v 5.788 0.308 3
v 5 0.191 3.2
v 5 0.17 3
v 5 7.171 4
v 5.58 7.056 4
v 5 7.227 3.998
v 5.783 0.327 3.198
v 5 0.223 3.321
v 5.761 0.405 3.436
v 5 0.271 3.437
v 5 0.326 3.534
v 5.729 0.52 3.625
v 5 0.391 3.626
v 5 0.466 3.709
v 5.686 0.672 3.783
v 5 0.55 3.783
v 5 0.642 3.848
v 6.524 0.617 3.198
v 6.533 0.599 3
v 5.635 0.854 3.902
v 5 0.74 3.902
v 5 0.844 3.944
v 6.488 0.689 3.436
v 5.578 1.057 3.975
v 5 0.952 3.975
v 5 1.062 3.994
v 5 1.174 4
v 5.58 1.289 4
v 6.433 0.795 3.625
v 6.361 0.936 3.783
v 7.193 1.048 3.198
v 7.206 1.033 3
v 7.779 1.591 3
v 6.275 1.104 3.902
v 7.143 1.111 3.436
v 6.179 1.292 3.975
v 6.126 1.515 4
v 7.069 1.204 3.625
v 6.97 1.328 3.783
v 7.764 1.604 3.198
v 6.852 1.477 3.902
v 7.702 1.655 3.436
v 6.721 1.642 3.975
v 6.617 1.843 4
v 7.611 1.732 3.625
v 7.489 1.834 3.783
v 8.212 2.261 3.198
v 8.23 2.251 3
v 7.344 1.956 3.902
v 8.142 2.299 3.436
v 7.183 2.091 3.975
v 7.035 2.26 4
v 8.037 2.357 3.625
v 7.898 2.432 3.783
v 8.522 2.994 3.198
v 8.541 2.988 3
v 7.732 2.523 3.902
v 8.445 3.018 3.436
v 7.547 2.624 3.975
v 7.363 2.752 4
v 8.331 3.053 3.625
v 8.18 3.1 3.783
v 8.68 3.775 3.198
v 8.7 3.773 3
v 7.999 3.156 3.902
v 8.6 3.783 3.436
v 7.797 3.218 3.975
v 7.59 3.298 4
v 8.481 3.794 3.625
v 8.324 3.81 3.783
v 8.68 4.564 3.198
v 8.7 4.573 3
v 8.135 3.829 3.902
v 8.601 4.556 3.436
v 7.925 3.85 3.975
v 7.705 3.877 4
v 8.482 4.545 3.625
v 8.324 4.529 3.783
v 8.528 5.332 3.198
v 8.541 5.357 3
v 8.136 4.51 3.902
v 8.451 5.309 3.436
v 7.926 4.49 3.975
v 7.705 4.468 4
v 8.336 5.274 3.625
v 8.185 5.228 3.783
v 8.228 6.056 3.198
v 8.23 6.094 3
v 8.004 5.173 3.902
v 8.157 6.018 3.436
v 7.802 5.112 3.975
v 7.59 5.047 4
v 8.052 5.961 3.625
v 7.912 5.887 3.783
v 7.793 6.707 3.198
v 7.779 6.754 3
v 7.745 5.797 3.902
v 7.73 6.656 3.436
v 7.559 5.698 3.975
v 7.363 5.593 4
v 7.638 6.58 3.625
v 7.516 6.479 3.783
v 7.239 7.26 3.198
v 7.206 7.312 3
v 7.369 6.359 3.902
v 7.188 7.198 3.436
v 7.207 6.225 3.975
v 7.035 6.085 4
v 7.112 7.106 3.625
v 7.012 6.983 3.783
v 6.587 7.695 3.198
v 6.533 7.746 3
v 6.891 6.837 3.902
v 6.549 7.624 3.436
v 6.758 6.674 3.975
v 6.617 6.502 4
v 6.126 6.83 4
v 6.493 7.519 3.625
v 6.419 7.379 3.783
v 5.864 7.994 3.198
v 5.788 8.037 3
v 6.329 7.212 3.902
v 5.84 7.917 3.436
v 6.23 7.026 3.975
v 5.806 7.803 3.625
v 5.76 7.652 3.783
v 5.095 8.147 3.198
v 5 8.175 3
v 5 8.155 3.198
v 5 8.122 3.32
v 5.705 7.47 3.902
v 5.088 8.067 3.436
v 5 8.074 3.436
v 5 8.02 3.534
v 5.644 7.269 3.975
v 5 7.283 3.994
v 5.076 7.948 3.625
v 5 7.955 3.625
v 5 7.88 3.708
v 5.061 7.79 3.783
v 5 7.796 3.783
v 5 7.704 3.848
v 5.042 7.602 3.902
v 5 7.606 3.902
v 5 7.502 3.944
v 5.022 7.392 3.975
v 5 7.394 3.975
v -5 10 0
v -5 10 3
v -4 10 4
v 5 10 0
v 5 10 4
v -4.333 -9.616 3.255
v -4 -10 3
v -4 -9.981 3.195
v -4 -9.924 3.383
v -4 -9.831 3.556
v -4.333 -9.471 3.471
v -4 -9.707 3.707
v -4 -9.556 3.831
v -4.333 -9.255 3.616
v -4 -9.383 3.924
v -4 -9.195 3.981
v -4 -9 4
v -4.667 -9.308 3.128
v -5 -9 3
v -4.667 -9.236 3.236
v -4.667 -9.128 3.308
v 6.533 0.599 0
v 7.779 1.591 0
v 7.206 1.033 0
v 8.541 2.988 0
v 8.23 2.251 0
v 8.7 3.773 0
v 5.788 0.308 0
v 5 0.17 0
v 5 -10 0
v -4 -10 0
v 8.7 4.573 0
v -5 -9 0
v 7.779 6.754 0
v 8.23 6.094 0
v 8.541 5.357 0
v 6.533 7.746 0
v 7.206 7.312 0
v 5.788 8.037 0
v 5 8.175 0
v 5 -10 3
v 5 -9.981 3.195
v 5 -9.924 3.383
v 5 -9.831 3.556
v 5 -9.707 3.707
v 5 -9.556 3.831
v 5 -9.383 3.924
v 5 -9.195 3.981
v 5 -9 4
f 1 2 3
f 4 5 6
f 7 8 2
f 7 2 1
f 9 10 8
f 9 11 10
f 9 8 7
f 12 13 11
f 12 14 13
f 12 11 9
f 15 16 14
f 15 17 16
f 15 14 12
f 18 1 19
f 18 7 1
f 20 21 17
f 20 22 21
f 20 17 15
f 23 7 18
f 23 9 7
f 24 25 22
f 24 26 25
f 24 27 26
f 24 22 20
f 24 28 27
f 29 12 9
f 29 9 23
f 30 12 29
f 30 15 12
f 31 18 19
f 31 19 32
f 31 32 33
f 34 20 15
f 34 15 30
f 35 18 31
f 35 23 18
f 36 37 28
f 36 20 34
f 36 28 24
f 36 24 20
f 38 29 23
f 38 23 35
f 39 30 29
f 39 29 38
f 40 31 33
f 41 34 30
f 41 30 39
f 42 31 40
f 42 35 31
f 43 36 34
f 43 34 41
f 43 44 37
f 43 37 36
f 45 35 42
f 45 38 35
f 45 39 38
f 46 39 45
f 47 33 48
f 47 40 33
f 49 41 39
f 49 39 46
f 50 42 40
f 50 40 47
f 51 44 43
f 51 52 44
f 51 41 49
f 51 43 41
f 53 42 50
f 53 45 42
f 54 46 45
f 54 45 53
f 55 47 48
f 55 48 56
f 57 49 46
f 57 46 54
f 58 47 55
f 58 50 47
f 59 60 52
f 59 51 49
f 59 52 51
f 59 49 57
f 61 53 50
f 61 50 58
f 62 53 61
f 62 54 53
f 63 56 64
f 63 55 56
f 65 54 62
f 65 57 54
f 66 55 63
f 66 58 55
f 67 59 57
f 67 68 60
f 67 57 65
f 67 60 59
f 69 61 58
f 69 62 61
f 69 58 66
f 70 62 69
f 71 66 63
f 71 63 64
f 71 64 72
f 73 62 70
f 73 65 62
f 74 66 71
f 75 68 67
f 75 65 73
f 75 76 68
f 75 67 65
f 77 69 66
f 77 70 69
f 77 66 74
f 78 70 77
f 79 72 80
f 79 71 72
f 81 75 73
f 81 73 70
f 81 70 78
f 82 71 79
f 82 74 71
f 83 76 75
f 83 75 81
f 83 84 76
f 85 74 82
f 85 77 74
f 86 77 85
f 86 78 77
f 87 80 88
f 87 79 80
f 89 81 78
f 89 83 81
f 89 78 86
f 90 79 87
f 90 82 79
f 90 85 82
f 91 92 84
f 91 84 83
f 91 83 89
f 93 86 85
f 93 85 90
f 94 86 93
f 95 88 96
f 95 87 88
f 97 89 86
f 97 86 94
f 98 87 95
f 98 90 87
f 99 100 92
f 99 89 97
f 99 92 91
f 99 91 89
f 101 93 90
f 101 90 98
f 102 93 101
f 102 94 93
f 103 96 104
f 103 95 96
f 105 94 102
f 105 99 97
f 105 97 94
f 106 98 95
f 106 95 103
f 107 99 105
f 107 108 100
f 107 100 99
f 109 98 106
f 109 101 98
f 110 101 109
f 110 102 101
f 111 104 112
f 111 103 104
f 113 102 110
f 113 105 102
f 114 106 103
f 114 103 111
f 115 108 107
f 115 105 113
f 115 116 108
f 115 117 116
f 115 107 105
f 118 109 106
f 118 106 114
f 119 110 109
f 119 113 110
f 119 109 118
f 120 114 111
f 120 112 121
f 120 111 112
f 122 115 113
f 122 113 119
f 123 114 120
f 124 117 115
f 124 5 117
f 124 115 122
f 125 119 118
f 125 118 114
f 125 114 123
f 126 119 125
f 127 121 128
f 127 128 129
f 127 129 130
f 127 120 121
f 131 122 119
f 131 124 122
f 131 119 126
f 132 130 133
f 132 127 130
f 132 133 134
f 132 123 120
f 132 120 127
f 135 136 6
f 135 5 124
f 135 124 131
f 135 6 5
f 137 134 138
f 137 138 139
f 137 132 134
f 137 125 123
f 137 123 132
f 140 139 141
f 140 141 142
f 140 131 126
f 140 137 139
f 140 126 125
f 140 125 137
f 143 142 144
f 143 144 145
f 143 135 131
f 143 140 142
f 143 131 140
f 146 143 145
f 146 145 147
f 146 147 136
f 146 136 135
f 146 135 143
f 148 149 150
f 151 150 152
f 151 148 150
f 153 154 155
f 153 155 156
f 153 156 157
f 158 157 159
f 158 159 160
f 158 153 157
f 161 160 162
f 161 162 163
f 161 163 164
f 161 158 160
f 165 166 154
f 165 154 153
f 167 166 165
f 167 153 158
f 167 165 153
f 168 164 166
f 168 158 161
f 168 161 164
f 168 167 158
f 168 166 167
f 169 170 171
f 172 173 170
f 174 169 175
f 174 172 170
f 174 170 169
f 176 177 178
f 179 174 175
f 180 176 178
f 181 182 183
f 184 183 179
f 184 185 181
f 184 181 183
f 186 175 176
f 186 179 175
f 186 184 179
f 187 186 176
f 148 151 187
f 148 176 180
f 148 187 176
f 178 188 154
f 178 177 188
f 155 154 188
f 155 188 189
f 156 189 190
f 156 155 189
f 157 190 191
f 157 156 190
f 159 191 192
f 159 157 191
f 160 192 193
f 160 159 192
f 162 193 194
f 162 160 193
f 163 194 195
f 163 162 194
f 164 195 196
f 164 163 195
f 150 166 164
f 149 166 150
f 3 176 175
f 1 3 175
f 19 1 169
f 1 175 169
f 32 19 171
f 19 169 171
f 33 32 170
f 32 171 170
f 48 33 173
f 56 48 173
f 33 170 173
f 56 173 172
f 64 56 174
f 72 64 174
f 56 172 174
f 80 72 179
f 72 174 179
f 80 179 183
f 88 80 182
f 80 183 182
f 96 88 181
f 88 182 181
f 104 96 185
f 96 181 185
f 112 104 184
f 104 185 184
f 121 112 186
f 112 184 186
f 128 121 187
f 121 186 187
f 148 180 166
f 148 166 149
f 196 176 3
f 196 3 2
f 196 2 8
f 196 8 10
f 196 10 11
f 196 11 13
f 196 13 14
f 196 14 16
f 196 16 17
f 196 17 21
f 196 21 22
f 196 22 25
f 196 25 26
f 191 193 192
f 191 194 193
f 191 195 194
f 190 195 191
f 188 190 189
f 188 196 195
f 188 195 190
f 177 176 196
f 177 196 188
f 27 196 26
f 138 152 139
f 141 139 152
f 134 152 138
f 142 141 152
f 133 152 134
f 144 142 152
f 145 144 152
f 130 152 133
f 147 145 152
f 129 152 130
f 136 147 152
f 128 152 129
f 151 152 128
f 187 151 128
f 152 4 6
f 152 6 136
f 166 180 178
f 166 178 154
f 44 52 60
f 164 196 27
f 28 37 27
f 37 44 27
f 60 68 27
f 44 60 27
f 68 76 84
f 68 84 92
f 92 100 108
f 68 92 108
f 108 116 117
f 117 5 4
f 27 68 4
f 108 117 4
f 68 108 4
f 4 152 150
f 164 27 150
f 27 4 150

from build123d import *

# Parameters (mm, degrees)
PAD_DEPTH    = 4
FILLET_R     = 1
FILLET001_R  = 1
CHAMFER_SIZE = 1


with BuildPart() as part:
    # Sketch → Pad (new body)
    with BuildSketch(Plane.XY):
        with BuildLine():
            Line((-5, 10), (5, 10))
            Line((5, 10), (5, 8.174655))
            ThreePointArc((5, 0.170411), (8.719489, 4.172533), (5, 8.174655))
            Line((5, 0.170411), (5, -10))
            Line((5, -10), (-5, -10))
            Line((-5, -10), (-5, 10))
        make_face()
    extrude(amount=PAD_DEPTH)

    # Fillet
    fillet_edges = [part.edges().sort_by_distance(p)[0] for p in [
        (8.719489, 4.172533, 4),
    ]]
    fillet(fillet_edges, radius=FILLET_R)

    # Fillet001
    fillet001_edges = [part.edges().sort_by_distance(p)[0] for p in [
        (0, -10, 4),
    ]]
    fillet(fillet001_edges, radius=FILLET001_R)

    # Chamfer
    chamfer_edges = [part.edges().sort_by_distance(p)[0] for p in [
        (-5, 0.5, 4),
    ]]
    chamfer(chamfer_edges, length=CHAMFER_SIZE)


solid = part.part
